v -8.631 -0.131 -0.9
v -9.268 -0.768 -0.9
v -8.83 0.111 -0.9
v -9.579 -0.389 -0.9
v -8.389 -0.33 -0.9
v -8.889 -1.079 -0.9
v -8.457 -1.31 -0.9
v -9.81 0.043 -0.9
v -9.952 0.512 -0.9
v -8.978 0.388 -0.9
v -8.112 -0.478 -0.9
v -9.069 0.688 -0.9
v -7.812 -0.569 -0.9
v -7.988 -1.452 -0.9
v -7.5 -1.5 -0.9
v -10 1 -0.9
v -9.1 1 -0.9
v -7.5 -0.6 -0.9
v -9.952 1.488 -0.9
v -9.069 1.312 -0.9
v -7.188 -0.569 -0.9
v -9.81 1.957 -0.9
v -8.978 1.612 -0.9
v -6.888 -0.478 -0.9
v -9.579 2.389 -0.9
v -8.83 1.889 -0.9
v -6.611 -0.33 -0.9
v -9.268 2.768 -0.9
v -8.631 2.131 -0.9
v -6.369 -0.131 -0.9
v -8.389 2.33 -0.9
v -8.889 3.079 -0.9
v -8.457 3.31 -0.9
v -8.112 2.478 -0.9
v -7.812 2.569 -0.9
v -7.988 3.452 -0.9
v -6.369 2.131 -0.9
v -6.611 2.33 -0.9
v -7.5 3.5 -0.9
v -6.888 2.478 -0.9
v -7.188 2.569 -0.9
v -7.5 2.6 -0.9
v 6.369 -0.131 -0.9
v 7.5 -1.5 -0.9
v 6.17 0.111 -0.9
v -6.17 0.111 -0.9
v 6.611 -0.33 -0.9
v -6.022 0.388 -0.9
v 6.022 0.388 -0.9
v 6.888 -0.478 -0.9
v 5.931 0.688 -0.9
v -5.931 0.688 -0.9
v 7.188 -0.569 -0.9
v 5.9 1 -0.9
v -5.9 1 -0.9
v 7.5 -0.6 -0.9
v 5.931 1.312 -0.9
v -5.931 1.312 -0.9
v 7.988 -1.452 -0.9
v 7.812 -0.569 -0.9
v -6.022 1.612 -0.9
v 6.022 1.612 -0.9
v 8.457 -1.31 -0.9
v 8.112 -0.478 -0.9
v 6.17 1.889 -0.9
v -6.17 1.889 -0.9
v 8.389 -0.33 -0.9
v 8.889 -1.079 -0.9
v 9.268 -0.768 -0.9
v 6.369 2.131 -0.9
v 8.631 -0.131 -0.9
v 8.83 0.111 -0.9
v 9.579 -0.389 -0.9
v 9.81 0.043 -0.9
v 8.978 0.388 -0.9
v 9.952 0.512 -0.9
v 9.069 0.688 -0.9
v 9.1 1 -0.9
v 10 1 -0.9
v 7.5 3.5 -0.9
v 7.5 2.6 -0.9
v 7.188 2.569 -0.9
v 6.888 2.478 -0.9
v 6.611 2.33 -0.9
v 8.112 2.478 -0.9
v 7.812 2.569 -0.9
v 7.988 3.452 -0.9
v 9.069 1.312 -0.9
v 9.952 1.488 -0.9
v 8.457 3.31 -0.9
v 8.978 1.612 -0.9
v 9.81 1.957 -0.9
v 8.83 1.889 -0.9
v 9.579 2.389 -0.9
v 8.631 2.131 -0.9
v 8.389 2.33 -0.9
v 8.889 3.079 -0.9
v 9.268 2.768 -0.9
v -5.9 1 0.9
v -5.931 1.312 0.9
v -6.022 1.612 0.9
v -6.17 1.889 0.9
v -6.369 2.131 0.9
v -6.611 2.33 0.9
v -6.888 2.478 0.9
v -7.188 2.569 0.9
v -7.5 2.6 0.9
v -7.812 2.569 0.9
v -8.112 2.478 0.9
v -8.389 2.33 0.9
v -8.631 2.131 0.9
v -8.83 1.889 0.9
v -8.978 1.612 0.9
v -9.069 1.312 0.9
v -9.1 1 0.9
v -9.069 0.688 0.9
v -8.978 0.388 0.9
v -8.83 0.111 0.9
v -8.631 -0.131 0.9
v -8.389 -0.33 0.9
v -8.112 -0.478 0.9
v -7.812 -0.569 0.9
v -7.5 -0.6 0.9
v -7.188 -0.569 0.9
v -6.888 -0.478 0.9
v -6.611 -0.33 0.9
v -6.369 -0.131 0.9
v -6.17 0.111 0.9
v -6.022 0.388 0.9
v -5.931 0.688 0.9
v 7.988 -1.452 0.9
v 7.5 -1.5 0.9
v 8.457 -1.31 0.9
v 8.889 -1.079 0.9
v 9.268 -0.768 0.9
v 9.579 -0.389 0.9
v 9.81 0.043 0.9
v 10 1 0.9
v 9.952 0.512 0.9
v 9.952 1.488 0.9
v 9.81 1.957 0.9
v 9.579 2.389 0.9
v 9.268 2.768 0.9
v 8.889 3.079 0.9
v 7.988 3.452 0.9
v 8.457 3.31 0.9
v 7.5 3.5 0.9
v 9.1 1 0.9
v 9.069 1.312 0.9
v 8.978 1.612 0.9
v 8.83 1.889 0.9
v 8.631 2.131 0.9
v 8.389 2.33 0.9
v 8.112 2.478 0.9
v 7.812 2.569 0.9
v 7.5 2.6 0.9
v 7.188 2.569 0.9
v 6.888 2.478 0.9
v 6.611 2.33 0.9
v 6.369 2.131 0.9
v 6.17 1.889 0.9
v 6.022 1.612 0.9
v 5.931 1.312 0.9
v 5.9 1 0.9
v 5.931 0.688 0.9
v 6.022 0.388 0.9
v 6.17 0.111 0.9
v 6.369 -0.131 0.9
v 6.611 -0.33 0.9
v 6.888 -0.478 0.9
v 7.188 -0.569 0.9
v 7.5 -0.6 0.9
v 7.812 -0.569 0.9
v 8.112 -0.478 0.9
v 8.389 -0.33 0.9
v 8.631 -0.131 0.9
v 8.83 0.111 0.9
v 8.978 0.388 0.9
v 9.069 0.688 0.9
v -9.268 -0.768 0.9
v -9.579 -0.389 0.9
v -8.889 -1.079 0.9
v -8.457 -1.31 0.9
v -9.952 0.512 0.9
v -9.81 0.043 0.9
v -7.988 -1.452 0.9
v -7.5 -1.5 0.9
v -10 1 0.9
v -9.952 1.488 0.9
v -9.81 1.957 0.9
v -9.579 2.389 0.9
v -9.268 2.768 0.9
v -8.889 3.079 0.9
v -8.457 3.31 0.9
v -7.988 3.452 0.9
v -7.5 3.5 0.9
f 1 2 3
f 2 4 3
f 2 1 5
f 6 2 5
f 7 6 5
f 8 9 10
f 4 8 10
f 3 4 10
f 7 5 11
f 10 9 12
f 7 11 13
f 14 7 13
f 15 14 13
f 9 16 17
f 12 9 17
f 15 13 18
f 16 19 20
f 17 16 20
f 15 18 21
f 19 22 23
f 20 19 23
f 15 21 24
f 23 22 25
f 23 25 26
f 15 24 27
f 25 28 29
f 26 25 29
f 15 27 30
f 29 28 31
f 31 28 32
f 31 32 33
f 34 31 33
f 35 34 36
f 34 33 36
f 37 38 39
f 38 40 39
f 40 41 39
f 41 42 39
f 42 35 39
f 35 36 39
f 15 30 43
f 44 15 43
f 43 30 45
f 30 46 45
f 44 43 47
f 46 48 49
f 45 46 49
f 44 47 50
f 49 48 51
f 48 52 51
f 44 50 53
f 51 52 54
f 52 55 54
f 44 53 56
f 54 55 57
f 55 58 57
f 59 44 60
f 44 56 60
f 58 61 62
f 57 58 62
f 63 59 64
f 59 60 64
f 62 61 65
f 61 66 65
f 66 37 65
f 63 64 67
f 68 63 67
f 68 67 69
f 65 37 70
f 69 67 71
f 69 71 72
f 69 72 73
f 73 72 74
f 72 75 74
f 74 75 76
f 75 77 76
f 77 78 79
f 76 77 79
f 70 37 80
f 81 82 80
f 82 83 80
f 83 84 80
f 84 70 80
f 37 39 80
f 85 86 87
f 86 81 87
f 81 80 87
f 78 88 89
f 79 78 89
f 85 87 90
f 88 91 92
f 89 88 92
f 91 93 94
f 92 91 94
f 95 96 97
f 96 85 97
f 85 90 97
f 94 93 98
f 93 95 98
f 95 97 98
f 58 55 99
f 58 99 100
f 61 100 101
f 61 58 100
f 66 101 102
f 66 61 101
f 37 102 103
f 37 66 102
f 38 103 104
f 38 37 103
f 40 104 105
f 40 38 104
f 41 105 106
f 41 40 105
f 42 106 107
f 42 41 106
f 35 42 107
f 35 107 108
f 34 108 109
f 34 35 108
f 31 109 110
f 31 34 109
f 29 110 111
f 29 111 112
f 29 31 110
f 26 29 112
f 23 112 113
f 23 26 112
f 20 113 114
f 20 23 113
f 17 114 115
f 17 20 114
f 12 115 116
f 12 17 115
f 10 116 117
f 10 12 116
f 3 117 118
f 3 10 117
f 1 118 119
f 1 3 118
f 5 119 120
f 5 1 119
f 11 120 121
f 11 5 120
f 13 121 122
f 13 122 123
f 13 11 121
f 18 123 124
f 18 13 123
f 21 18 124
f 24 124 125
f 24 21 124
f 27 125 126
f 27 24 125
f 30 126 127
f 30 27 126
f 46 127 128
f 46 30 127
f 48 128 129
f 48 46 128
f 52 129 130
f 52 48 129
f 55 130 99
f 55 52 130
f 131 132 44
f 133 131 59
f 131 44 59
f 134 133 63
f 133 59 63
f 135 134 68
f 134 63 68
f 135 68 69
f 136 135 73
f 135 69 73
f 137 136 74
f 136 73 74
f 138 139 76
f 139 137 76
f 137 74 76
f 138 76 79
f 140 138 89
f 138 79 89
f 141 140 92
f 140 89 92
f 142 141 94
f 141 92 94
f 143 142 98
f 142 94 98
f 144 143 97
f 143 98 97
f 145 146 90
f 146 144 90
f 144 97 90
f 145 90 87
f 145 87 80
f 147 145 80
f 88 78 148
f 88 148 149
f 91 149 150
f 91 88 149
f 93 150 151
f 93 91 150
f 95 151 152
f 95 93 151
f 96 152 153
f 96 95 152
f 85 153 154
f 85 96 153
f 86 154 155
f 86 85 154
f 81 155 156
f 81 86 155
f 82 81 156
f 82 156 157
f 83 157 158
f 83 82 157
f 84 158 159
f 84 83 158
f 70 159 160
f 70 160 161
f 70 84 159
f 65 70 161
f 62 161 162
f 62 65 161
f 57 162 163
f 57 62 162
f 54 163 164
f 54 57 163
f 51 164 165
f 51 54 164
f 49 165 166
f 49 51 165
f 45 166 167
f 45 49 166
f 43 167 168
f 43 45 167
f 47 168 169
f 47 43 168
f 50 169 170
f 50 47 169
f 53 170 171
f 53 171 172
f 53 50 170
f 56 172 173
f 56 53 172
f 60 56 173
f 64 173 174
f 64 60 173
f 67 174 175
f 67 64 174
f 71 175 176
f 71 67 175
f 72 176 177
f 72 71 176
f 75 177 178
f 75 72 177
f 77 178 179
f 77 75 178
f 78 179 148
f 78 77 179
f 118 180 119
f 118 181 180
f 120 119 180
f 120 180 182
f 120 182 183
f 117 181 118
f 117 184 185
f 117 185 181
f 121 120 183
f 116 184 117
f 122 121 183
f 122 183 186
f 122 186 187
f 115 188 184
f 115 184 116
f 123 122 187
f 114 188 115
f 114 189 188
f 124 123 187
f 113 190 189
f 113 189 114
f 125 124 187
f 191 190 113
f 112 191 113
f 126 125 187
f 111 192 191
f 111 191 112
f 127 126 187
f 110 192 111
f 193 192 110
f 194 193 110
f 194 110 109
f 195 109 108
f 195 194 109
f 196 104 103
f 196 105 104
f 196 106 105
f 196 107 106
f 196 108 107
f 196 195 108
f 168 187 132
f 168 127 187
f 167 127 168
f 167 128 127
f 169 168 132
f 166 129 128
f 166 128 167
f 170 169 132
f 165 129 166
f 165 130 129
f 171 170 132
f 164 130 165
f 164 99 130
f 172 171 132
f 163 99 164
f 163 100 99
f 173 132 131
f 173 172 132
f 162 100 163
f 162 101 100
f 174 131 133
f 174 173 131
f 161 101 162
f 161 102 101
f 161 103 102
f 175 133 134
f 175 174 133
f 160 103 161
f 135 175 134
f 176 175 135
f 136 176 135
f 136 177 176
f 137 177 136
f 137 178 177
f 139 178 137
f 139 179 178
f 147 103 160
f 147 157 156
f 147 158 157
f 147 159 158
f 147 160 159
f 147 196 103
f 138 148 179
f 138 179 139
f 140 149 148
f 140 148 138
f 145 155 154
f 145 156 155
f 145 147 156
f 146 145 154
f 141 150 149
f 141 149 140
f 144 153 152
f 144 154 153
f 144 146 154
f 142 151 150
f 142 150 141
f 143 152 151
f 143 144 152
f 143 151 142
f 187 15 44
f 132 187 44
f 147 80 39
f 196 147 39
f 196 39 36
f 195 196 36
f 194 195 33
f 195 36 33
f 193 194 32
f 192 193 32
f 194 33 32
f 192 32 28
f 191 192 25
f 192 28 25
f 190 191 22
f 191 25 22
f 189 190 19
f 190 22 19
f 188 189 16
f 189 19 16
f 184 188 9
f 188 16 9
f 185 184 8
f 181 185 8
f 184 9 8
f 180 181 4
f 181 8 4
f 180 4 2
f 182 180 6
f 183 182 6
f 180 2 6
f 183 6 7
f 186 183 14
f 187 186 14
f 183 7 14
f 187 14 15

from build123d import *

# Parameters (mm, degrees)
BOSS_EXTRUDE2_DEPTH      = 0.9
BOSS_EXTRUDE2_DEPTH_BACK = 0.9
SKETCH1_R                = 1.6


with BuildPart() as part:
    # Sketch1 → Boss-Extrude2 (new, two sides: drawn at the far end of the back side and taken through both)
    with BuildSketch(Plane.XY.offset(-BOSS_EXTRUDE2_DEPTH_BACK)):
        with BuildLine():
            Line((7.5, 3.5), (-7.5, 3.5))
            ThreePointArc((-7.5, 3.5), (-10, 1), (-7.5, -1.5))
            Line((-7.5, -1.5), (7.5, -1.5))
            ThreePointArc((7.5, -1.5), (10, 1), (7.5, 3.5))
        make_face()
        with Locations((7.5, 1)):
            Circle(SKETCH1_R, mode=Mode.SUBTRACT)
        with Locations((-7.5, 1)):
            Circle(SKETCH1_R, mode=Mode.SUBTRACT)
    extrude(amount=BOSS_EXTRUDE2_DEPTH + BOSS_EXTRUDE2_DEPTH_BACK)


solid = part.part
